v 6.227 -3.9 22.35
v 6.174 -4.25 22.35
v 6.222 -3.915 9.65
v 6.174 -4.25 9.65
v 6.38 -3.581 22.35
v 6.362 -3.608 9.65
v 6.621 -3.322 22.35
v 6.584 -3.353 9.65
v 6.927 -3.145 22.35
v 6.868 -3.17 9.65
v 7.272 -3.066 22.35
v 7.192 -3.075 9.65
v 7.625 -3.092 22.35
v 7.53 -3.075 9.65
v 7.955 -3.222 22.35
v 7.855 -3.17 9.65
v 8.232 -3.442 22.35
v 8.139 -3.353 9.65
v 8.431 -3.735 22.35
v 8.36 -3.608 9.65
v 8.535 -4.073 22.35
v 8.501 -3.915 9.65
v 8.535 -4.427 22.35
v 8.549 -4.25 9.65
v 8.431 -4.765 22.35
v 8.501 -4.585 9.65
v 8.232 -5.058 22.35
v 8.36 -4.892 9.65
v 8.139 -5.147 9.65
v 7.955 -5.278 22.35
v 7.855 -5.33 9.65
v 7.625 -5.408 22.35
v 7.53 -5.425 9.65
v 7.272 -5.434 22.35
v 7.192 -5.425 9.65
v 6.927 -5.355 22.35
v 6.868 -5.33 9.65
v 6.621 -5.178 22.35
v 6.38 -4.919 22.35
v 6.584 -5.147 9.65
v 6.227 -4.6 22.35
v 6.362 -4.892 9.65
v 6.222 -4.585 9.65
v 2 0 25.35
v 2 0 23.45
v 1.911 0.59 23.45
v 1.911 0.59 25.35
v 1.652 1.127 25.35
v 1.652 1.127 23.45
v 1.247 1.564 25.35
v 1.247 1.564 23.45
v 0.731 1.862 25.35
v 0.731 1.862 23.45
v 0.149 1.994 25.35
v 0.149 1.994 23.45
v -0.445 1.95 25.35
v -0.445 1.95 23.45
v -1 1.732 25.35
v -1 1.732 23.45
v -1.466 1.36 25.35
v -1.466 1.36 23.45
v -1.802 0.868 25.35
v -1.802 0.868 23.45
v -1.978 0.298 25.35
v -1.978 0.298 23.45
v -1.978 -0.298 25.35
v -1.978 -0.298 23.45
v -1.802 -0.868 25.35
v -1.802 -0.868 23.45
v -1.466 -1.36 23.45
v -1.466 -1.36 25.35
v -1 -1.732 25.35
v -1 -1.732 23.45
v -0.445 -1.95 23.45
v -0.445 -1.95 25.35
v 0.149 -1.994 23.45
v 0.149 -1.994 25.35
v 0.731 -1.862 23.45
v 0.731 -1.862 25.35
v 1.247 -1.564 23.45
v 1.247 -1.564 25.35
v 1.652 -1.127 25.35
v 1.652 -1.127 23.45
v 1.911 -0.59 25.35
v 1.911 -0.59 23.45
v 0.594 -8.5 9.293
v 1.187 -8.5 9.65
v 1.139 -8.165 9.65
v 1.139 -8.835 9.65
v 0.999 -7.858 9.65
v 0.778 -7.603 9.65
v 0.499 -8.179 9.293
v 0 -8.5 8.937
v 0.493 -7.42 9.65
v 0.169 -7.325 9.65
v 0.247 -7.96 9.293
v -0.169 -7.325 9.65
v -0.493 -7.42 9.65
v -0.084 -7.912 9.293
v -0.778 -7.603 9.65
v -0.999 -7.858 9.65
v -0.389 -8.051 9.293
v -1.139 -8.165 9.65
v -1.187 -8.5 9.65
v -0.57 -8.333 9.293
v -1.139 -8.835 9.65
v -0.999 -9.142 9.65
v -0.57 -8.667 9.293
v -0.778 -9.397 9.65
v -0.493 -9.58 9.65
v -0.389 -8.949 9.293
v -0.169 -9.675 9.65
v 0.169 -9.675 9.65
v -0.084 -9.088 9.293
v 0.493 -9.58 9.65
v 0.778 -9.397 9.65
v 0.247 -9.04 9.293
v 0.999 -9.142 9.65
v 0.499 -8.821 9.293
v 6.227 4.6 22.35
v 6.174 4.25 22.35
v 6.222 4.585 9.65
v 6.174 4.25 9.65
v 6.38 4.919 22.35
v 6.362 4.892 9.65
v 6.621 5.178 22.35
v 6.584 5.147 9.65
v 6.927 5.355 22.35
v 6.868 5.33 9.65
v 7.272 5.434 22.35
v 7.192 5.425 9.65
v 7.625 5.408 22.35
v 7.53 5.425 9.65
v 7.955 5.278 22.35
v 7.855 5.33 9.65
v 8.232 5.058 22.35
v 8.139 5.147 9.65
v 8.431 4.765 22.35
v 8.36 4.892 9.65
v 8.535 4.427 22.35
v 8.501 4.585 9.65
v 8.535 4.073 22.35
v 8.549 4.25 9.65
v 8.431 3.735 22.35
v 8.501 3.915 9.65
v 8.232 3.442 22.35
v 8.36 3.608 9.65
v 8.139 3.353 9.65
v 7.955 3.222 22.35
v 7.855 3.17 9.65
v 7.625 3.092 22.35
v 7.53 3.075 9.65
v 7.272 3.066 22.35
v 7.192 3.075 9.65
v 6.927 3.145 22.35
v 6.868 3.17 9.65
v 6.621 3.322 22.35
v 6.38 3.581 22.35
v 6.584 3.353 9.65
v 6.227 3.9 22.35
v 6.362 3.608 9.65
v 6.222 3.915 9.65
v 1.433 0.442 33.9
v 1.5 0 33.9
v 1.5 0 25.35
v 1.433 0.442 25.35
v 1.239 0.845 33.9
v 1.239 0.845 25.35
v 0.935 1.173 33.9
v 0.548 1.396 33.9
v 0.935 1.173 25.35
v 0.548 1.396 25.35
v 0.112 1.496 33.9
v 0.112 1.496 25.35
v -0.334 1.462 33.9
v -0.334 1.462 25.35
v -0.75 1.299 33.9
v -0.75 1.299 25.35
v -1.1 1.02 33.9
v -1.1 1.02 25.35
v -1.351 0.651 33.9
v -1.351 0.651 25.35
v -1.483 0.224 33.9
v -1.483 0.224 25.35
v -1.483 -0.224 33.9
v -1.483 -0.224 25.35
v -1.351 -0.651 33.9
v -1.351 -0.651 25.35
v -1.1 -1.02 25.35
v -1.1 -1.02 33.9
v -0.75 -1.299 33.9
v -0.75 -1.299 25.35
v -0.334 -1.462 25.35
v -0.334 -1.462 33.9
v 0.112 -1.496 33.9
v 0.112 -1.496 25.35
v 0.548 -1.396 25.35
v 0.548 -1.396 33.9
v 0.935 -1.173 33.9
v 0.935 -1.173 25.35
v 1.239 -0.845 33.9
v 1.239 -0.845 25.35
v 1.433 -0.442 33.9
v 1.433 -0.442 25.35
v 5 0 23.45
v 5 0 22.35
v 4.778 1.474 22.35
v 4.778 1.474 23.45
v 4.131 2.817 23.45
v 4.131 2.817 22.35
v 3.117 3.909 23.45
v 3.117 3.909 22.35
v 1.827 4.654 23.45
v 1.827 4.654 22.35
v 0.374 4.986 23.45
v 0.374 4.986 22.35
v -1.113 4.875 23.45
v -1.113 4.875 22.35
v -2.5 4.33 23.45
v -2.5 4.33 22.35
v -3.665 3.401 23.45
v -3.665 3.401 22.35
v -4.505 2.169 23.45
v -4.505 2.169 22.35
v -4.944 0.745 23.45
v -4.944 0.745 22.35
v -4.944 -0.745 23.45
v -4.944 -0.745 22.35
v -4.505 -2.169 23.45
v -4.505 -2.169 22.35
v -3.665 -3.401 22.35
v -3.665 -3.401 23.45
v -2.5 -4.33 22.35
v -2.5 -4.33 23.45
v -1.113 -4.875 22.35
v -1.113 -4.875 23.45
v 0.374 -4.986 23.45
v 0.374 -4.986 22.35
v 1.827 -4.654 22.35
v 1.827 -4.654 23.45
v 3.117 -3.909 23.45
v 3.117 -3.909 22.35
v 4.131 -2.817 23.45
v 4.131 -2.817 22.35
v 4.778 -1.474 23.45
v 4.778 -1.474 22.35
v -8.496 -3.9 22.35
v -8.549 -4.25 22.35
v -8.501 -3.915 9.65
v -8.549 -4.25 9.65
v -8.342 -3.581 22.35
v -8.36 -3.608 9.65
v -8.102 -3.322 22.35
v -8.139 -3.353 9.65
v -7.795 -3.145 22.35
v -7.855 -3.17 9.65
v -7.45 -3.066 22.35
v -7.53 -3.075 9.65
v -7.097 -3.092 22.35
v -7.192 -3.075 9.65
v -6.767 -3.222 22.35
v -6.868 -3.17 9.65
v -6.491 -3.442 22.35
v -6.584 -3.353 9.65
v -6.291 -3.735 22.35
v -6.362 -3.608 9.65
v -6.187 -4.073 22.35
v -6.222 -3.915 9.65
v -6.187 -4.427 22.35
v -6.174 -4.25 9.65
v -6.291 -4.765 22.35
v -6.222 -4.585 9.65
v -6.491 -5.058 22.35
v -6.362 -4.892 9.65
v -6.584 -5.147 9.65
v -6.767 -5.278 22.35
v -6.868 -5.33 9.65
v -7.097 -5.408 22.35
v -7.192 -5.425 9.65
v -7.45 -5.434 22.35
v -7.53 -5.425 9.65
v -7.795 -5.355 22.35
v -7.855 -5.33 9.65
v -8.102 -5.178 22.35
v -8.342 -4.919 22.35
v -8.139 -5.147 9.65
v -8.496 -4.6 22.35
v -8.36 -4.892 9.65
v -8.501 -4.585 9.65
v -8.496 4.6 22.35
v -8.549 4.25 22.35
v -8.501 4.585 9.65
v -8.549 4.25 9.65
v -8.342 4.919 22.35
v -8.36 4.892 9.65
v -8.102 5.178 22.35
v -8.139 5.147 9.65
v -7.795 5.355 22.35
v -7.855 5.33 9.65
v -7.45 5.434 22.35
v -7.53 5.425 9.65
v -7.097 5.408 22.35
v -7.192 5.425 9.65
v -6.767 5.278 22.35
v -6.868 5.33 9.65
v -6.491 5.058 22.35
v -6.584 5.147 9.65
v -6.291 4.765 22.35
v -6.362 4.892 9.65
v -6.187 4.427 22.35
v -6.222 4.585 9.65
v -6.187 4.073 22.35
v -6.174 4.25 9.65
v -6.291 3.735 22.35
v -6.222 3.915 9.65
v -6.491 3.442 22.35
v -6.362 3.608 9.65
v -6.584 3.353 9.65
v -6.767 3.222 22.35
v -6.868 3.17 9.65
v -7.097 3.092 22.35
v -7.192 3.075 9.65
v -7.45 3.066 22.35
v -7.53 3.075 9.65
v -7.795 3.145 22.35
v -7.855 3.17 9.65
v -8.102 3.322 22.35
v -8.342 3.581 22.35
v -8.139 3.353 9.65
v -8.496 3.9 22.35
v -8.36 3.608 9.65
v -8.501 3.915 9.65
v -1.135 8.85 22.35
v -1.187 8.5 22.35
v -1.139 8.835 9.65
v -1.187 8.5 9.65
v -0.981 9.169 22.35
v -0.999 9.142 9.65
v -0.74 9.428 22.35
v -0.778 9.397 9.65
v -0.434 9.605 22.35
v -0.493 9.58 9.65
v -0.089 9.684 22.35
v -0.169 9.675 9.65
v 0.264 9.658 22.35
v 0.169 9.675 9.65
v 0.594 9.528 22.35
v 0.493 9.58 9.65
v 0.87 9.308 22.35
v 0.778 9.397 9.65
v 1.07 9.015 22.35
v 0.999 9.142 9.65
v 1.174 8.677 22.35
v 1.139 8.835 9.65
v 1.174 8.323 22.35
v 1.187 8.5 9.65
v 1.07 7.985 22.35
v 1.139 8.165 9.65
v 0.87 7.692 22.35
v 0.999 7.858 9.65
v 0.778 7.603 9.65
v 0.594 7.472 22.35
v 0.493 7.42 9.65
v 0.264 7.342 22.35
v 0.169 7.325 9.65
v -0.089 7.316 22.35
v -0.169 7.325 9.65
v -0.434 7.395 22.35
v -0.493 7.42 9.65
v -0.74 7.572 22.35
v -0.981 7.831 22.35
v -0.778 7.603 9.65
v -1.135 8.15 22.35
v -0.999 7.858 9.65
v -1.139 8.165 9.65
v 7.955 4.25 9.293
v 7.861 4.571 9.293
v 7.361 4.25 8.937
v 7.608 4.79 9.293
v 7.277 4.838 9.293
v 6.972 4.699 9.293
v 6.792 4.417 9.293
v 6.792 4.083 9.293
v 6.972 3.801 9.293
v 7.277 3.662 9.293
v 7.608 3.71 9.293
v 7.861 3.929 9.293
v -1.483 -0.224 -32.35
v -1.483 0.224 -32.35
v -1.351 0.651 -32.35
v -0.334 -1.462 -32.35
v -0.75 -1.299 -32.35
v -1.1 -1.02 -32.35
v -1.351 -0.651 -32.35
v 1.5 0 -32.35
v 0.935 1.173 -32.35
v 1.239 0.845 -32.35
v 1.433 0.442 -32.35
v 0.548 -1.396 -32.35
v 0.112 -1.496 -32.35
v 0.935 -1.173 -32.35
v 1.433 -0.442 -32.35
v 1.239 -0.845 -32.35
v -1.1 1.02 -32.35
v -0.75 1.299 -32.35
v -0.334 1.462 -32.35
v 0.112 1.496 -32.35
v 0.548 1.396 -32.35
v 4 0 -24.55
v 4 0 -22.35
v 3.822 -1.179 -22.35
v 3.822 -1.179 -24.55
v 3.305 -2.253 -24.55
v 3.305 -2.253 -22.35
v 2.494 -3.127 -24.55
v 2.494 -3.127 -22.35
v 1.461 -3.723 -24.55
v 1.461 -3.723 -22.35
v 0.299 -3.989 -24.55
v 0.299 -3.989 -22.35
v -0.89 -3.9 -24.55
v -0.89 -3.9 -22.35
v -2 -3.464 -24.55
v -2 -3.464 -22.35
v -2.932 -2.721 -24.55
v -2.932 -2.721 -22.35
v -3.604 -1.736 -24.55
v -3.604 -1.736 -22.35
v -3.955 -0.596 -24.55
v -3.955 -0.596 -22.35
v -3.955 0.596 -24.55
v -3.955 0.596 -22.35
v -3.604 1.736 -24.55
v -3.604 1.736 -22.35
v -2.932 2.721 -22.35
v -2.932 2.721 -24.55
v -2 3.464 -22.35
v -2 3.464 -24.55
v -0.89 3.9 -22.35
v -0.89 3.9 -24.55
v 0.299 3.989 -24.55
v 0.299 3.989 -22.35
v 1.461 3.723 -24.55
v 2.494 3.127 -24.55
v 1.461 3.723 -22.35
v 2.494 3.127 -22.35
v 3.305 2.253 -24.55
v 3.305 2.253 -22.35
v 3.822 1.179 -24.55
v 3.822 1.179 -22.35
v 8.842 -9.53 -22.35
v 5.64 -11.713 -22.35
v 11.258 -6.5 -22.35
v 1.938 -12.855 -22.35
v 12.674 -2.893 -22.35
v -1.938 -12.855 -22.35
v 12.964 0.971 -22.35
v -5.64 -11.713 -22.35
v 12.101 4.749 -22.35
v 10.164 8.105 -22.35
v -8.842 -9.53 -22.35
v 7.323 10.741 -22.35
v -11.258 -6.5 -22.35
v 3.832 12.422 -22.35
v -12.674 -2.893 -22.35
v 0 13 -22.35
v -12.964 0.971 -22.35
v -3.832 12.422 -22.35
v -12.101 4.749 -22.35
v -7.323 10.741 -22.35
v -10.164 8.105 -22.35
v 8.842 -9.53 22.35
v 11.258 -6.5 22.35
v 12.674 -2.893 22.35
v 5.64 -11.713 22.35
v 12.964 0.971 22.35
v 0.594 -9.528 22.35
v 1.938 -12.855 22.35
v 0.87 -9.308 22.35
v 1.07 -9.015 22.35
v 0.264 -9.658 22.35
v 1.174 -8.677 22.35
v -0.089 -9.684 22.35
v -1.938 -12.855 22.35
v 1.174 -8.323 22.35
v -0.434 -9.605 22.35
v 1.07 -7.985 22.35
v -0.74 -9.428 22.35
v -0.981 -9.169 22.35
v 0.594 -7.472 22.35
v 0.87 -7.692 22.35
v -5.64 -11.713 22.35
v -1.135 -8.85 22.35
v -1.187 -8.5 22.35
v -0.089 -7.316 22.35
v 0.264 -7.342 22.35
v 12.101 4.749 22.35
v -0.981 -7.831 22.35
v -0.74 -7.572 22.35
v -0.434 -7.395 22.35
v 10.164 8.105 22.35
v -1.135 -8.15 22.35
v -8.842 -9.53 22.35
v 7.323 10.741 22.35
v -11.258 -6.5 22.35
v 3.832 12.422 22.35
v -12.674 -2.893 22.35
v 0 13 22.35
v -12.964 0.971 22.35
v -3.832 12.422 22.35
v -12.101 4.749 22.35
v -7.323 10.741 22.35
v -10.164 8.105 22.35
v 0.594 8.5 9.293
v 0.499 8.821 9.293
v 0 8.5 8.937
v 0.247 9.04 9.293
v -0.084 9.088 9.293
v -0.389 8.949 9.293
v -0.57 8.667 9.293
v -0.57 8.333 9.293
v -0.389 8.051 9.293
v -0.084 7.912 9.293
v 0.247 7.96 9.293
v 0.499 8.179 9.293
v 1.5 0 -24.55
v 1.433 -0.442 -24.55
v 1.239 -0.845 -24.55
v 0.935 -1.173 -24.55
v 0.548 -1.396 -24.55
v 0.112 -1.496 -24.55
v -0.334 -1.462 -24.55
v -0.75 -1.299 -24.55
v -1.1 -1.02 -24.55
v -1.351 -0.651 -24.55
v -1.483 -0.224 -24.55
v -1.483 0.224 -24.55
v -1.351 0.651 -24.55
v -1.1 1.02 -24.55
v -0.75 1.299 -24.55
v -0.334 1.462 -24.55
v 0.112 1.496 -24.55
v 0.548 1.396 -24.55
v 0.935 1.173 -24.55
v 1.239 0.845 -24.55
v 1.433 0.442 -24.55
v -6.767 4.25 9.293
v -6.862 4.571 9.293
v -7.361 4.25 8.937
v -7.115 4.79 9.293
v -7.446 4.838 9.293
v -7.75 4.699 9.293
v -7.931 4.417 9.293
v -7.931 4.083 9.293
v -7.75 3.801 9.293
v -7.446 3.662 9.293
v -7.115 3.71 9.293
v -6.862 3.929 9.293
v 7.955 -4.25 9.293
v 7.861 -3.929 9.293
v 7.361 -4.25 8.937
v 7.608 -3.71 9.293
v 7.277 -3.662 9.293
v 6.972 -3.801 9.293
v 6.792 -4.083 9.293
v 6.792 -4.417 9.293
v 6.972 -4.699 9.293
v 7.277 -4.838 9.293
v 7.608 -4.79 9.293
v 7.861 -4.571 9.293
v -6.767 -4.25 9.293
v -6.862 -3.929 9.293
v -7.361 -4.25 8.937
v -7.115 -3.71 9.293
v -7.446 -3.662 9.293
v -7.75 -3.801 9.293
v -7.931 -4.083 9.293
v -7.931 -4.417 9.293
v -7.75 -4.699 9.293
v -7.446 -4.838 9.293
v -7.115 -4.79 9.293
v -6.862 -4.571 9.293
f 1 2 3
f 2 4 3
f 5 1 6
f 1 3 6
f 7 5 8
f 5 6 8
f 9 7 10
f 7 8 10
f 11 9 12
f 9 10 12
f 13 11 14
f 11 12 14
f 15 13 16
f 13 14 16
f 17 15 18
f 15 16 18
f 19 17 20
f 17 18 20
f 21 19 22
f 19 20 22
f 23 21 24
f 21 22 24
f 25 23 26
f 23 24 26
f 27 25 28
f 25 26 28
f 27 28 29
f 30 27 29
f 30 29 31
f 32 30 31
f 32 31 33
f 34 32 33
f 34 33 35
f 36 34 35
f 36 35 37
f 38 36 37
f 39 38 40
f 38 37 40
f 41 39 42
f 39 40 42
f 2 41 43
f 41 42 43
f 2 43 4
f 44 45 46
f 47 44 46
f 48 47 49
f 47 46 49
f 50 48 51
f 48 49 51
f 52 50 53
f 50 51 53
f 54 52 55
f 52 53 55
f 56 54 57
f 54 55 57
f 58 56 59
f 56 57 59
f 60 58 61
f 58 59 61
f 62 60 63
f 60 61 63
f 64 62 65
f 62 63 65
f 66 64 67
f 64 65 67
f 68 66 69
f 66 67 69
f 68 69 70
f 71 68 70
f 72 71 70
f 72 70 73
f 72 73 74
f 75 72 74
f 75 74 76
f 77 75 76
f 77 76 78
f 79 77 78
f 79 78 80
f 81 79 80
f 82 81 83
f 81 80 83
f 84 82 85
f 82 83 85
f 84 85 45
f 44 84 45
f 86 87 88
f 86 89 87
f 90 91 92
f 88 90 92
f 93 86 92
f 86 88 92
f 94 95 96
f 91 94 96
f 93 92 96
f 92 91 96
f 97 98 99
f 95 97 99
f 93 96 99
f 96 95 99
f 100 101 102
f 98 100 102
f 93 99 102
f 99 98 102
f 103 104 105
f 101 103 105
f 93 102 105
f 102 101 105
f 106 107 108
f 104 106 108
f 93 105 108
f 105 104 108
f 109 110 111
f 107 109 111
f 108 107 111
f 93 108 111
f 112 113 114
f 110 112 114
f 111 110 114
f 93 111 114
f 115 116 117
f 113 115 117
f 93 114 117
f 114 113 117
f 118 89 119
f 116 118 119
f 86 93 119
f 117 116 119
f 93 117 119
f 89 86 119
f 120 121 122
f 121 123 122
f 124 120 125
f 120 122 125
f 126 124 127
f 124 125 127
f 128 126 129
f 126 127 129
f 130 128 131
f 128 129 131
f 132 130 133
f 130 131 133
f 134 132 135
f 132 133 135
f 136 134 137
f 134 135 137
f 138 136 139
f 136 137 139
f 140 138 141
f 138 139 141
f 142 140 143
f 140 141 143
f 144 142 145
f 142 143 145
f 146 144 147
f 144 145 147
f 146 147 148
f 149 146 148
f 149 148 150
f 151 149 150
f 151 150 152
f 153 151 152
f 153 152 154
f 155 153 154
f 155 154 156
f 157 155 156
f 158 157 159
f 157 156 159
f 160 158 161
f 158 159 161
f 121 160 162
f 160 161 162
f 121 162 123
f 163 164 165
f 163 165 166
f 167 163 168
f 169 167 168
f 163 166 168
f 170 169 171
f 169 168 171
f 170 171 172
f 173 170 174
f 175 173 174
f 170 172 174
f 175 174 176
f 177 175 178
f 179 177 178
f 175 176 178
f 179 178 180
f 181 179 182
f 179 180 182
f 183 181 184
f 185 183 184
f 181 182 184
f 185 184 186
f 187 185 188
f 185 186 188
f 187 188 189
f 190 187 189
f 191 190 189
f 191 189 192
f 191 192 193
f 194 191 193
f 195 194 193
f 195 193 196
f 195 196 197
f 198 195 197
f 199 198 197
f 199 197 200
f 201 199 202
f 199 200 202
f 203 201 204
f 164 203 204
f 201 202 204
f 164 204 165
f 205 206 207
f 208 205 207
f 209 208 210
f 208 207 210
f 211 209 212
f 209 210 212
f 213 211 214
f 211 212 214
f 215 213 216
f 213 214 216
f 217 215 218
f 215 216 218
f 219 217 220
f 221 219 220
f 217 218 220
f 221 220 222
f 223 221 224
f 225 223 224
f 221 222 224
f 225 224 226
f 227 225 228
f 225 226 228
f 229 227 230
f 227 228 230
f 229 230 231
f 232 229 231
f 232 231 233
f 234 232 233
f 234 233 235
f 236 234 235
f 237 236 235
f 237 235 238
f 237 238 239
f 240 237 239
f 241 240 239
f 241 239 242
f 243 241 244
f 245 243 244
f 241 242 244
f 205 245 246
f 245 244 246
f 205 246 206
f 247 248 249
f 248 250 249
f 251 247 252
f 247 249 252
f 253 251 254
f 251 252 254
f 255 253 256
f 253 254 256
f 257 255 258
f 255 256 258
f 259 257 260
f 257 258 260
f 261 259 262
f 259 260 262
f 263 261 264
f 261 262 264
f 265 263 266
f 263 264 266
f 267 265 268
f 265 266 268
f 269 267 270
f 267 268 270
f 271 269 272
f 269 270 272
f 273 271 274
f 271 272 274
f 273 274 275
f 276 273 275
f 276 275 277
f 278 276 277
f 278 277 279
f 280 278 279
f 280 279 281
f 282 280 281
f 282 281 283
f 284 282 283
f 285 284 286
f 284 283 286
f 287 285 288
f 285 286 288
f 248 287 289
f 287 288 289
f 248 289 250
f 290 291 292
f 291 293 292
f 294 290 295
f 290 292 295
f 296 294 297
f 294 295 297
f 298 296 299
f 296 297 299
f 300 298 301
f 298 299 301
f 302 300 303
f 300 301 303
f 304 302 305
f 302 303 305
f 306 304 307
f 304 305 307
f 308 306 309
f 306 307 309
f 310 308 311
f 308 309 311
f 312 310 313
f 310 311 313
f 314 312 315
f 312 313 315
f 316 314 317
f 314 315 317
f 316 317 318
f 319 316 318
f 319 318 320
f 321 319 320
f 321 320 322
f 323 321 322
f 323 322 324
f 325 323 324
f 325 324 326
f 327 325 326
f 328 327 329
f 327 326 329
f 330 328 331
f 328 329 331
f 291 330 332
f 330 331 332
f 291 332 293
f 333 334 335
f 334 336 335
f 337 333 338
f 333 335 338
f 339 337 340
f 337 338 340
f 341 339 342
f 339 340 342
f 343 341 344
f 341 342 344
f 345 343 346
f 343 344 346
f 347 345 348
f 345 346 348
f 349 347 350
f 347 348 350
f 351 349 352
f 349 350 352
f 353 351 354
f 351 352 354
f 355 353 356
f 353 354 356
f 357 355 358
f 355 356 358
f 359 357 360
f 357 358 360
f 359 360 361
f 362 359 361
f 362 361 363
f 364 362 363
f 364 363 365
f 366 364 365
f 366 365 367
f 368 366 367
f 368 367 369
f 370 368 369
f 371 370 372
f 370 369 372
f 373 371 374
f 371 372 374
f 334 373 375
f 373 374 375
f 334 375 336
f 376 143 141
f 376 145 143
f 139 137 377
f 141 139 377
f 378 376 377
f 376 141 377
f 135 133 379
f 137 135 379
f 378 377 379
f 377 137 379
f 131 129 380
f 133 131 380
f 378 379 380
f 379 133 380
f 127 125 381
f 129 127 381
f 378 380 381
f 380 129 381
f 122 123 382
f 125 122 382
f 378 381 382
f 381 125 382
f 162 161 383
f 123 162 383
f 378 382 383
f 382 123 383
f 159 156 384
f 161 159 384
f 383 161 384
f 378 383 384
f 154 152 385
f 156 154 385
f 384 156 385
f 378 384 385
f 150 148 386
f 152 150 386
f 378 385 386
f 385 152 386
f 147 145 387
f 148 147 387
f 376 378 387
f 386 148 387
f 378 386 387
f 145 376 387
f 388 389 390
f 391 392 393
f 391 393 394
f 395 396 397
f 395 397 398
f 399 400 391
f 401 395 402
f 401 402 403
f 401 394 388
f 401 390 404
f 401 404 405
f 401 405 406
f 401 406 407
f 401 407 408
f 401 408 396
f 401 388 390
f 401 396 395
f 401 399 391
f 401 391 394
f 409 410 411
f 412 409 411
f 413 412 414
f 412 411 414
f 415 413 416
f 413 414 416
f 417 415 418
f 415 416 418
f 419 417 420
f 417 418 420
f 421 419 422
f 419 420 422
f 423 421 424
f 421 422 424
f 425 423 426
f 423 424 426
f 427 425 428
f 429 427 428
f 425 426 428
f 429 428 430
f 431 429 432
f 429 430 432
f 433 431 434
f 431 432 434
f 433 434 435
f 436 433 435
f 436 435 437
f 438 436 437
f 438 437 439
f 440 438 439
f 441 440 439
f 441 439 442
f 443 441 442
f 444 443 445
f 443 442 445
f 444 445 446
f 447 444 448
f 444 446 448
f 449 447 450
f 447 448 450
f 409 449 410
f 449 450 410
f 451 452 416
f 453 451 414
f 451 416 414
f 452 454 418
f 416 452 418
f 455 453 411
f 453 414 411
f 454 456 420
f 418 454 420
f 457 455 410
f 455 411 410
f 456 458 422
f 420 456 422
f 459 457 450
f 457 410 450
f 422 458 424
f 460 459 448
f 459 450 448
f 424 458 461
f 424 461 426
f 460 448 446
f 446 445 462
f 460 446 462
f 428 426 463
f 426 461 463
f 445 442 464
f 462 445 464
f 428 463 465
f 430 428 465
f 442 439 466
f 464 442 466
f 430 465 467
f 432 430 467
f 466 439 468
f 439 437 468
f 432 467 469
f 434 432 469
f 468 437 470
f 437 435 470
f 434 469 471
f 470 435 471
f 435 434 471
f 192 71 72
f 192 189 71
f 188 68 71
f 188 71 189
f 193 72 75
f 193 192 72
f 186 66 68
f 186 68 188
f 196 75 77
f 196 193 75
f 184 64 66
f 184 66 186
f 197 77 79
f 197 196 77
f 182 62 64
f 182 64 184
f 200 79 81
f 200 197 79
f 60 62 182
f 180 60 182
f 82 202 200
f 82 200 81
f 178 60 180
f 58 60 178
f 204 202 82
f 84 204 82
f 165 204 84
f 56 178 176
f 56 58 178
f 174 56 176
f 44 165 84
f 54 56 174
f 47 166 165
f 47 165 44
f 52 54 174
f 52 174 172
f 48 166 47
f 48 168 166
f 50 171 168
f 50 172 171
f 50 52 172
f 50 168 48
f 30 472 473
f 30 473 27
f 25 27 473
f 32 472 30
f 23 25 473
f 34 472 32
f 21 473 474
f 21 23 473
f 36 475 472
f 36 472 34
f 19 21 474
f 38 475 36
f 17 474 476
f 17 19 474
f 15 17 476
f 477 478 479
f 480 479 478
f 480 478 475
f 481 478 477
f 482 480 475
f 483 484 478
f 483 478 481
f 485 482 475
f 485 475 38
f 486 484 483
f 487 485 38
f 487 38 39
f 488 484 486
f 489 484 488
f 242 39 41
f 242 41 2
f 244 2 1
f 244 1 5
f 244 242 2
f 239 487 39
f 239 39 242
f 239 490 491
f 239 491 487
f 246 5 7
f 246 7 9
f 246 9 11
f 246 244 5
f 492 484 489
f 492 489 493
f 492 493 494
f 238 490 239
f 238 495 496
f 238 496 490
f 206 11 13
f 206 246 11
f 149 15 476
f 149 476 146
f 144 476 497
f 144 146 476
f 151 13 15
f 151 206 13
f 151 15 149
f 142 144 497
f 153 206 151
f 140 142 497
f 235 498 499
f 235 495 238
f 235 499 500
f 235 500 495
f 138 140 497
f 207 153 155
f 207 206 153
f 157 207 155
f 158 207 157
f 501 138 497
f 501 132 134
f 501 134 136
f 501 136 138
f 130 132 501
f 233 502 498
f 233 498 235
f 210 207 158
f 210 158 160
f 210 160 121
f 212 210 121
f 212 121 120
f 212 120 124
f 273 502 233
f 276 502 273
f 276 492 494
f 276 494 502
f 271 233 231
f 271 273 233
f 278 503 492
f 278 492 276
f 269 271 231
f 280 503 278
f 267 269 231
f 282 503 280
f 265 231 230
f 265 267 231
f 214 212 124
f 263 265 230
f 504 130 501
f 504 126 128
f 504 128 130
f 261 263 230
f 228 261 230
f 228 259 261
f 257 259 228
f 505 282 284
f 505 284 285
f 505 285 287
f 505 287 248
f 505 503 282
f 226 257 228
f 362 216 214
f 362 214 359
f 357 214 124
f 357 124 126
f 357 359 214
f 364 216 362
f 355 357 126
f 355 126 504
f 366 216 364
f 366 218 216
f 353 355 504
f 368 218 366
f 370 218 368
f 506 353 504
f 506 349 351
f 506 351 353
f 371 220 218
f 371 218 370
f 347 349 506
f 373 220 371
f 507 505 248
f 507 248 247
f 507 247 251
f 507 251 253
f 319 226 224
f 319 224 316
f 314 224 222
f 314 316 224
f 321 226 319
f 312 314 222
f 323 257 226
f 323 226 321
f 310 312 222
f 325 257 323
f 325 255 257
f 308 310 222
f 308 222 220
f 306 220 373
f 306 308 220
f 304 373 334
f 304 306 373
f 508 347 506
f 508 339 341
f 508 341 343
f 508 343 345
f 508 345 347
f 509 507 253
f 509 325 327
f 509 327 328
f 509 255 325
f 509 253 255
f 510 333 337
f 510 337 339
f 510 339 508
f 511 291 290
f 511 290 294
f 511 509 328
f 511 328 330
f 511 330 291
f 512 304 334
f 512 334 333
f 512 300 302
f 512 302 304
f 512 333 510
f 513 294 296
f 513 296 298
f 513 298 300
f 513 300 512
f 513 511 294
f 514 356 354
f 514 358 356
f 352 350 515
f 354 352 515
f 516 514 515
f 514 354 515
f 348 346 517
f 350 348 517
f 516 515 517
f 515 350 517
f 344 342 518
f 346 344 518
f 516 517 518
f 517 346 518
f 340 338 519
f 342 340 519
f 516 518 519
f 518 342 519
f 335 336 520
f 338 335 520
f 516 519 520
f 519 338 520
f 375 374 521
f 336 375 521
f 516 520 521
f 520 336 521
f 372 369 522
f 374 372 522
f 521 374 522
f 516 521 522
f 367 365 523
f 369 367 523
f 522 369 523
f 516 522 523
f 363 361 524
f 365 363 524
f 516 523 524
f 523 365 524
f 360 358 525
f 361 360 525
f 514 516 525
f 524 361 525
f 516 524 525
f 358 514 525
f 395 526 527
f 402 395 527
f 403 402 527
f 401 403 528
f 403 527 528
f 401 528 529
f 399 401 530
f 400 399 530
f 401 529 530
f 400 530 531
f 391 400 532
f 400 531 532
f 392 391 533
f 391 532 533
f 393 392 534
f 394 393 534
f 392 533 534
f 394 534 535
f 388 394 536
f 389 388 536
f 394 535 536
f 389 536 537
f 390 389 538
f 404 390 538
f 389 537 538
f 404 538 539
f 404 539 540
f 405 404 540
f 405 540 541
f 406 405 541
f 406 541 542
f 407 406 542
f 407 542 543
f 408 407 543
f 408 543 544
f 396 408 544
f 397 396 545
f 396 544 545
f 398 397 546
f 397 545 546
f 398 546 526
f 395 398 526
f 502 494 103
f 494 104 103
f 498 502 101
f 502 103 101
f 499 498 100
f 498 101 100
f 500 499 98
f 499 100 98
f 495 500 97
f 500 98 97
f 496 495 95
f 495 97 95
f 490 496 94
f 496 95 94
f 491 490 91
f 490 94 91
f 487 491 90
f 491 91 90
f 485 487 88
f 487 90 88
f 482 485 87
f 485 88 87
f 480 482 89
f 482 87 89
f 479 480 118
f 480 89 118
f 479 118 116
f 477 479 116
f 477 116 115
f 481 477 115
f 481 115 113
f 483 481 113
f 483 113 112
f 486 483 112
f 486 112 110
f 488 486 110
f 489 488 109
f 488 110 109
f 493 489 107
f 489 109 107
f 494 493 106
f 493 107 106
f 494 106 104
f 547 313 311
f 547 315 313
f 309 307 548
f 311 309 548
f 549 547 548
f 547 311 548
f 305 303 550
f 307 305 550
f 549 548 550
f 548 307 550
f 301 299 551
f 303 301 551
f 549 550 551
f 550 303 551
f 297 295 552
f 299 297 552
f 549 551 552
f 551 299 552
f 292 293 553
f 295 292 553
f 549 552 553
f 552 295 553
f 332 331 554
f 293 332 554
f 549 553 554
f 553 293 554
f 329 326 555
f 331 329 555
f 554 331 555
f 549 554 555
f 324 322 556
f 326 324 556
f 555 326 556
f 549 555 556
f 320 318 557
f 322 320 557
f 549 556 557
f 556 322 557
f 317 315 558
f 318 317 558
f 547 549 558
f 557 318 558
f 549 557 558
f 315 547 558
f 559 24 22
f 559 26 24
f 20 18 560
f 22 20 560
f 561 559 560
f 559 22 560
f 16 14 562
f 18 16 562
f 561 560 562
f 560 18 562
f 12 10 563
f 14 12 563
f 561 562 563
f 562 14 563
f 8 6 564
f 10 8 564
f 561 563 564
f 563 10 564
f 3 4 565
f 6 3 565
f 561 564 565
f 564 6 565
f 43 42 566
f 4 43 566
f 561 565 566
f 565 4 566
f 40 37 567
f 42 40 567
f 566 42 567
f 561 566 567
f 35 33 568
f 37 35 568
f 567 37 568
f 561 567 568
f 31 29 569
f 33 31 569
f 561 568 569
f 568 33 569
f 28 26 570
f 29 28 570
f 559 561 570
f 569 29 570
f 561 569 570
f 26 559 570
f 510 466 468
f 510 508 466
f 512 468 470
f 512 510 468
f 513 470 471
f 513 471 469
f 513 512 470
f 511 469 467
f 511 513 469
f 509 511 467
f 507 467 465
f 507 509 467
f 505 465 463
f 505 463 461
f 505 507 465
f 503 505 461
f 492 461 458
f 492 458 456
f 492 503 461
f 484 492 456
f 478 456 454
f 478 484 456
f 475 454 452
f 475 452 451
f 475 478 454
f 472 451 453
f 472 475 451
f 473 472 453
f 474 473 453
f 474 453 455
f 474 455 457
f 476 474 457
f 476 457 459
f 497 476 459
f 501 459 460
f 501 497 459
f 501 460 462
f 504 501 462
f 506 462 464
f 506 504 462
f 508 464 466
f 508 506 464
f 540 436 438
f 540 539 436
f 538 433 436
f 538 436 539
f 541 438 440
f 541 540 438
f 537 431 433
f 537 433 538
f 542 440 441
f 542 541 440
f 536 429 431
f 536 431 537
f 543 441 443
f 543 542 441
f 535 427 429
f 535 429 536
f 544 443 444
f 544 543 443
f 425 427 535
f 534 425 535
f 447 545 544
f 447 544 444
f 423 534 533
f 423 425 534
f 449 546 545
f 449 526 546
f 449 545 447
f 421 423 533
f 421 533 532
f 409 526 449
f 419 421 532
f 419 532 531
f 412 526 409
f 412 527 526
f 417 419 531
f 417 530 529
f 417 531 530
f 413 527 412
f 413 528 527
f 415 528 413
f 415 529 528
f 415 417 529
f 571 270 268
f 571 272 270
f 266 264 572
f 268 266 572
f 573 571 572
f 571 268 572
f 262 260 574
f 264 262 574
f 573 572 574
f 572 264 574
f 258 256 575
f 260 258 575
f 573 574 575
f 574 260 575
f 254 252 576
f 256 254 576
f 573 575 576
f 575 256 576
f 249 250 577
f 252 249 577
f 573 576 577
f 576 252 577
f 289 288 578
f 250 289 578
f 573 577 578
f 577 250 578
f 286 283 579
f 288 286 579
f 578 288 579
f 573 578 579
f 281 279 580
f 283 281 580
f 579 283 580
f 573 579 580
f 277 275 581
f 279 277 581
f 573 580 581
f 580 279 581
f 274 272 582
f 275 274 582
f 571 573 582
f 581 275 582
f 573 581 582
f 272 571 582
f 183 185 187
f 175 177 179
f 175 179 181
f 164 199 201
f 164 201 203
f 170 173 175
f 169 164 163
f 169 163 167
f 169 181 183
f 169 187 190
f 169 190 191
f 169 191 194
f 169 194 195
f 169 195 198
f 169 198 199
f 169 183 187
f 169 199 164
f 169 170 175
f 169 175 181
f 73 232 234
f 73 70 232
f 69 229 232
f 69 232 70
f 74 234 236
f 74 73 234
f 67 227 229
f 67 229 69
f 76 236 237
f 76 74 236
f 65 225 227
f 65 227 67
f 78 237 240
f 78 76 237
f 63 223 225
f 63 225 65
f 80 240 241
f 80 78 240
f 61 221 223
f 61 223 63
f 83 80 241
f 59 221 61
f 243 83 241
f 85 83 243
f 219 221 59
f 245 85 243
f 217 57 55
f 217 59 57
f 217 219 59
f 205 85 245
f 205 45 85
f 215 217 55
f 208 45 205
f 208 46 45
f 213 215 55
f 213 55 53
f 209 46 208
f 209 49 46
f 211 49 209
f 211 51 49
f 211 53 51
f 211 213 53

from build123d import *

# Parameters (mm, degrees)
SKETCH1_R                        = 13
BOSS_EXTRUDE1_DEPTH              = 22.35
SKETCH2_R                        = 5
BOSS_EXTRUDE2_DEPTH              = 1.1
SKETCH3_R                        = 2
BOSS_EXTRUDE3_DEPTH              = 1.9
SKETCH4_R                        = 1.5
BOSS_EXTRUDE4_DEPTH              = 8.55
SKETCH5_R                        = 4
BOSS_EXTRUDE5_DEPTH              = 2.2
SKETCH6_R                        = 1.5
BOSS_EXTRUDE6_DEPTH              = 7.8
F_42_0_0935_DIAMETER_HOLE1_D     = 2.3749
F_42_0_0935_DIAMETER_HOLE1_DEPTH = 12.7
F_42_0_0935_DIAMETER_HOLE1_TIP   = 0.713491942


with BuildPart() as part:
    # Sketch1 → Boss-Extrude1 (new body, symmetric)
    with BuildSketch(Plane(origin=(0, 0, 0), x_dir=(0, 1, 0), z_dir=(0, 0, 1))):
        Circle(SKETCH1_R)
    extrude(amount=BOSS_EXTRUDE1_DEPTH, both=True)

    # Sketch2 → Boss-Extrude2 (add)
    with BuildSketch(Plane.XY.offset(22.35)):
        Circle(SKETCH2_R)
    extrude(amount=BOSS_EXTRUDE2_DEPTH)

    # Sketch3 → Boss-Extrude3 (add)
    with BuildSketch(Plane.XY.offset(23.45)):
        Circle(SKETCH3_R)
    extrude(amount=BOSS_EXTRUDE3_DEPTH)

    # Sketch4 → Boss-Extrude4 (add)
    with BuildSketch(Plane.XY.offset(25.35)):
        Circle(SKETCH4_R)
    extrude(amount=BOSS_EXTRUDE4_DEPTH)

    # Sketch5 → Boss-Extrude5 (add)
    with BuildSketch(Plane(origin=(0, 0, -22.35), x_dir=(1, 0, 0), z_dir=(0, 0, -1))):
        Circle(SKETCH5_R)
    extrude(amount=BOSS_EXTRUDE5_DEPTH)

    # Sketch6 → Boss-Extrude6 (add)
    with BuildSketch(Plane(origin=(0, 0, -24.55), x_dir=(1, 0, 0), z_dir=(0, 0, -1))):
        Circle(SKETCH6_R)
    extrude(amount=BOSS_EXTRUDE6_DEPTH)

    # #42 (0.0935) Diameter Hole1
    with Locations(Plane.XY.offset(22.35)):
        with Locations((7.361215932, -4.25), (0, 8.5), (-7.361215932, 4.25), (-7.361215932, -4.25), (7.361215932, 4.25), (0, -8.5)):
            Hole(F_42_0_0935_DIAMETER_HOLE1_D / 2, depth=F_42_0_0935_DIAMETER_HOLE1_DEPTH)
            with Locations((0, 0, -(F_42_0_0935_DIAMETER_HOLE1_DEPTH + F_42_0_0935_DIAMETER_HOLE1_TIP / 2))):  # 118° drill point
                Cone(0, F_42_0_0935_DIAMETER_HOLE1_D / 2, F_42_0_0935_DIAMETER_HOLE1_TIP, mode=Mode.SUBTRACT)


solid = part.part
